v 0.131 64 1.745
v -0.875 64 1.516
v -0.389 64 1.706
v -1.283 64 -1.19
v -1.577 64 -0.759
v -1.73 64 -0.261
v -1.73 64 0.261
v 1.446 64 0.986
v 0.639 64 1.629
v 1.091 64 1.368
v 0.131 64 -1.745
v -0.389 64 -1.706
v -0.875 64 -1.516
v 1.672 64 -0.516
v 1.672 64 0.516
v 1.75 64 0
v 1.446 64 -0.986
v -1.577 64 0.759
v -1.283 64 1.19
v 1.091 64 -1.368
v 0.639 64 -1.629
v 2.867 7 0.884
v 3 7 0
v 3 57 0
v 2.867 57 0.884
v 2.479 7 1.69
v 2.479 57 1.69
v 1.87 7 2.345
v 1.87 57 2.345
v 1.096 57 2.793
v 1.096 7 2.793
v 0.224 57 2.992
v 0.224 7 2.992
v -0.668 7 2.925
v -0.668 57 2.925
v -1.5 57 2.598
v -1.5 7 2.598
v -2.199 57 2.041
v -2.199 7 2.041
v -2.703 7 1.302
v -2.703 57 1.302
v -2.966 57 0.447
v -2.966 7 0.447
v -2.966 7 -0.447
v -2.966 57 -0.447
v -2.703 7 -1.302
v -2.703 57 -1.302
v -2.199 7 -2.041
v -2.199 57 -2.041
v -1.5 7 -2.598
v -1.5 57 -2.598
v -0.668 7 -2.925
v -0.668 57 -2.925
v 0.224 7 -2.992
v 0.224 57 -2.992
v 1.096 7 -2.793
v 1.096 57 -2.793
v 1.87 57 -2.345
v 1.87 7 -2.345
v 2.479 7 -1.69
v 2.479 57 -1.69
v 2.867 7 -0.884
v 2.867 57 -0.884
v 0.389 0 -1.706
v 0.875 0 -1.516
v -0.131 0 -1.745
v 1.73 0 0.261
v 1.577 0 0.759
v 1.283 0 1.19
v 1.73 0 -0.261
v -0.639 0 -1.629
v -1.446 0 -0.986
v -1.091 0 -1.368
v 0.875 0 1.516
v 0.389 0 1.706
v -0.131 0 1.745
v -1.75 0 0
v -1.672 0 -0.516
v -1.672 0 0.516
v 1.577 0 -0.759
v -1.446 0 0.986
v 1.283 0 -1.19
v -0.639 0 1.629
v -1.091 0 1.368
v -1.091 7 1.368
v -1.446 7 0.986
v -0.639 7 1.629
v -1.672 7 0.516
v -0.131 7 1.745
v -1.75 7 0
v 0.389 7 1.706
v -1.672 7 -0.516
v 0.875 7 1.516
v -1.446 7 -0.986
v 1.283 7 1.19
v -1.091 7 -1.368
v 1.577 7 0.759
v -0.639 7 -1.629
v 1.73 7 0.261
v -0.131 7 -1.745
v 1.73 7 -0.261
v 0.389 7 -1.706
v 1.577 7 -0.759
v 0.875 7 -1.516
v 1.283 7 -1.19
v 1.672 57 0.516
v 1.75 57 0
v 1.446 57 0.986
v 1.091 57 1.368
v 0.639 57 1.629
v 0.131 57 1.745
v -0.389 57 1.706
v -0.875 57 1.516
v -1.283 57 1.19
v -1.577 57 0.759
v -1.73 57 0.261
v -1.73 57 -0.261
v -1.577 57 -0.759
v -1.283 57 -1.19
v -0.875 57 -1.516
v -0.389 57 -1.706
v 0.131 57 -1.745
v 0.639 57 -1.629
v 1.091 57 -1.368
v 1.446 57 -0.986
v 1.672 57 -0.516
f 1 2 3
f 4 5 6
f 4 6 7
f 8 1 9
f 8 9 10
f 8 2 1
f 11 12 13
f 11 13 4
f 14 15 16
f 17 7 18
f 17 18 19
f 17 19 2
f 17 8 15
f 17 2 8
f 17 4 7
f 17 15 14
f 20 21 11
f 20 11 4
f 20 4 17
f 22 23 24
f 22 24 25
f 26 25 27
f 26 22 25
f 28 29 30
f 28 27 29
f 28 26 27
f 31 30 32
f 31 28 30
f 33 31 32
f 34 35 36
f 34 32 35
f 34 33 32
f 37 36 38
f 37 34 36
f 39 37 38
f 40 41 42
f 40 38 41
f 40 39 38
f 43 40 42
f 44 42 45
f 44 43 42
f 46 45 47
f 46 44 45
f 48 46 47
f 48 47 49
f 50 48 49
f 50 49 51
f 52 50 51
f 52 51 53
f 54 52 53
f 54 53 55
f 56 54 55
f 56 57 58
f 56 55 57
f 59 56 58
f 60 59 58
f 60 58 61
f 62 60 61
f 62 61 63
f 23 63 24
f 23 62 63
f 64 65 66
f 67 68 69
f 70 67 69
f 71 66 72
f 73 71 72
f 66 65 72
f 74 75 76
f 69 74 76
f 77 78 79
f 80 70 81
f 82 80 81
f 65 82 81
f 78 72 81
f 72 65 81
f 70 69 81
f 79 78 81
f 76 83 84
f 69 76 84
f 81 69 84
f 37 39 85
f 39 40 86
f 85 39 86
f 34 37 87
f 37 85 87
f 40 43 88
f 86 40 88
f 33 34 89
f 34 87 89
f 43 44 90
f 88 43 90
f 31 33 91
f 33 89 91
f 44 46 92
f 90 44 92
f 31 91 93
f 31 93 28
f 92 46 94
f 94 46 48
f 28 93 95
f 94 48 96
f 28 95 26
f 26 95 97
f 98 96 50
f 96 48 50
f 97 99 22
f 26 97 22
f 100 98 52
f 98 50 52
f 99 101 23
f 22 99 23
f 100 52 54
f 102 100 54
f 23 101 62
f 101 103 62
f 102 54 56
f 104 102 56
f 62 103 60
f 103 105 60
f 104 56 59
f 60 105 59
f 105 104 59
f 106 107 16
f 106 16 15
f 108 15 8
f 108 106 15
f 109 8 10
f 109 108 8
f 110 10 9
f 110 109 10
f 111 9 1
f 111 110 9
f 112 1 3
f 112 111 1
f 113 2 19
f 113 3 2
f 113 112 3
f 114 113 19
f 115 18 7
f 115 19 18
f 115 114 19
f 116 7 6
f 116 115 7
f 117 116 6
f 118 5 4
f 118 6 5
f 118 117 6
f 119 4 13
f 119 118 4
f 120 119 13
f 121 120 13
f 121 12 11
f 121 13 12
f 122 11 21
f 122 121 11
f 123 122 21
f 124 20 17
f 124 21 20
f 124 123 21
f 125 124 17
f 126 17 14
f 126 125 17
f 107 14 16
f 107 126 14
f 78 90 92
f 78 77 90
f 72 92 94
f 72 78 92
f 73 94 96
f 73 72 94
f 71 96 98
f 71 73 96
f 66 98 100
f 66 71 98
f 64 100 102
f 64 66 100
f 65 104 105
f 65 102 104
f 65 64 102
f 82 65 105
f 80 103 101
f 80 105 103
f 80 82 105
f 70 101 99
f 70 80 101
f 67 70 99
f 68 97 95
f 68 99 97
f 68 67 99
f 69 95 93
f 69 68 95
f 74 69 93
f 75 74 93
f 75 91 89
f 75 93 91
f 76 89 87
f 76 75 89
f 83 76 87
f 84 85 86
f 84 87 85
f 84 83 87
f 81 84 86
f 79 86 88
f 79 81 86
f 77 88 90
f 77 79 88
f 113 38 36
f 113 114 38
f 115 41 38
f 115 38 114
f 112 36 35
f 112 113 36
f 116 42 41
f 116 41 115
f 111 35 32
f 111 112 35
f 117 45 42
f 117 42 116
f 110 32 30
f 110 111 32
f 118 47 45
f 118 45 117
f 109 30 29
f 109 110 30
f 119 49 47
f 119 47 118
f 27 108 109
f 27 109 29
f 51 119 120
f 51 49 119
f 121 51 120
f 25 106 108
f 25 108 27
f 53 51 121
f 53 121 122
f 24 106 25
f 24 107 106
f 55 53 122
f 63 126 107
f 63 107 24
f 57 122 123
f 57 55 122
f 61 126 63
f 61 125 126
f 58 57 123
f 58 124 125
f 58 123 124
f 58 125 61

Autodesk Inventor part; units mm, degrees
ref_plane "XZ Plane" through (0, 0, 0) normal (0, 1, 0) x (-1, 0, 0)
sketch "Szkic1" plane through (0, 0, 0) normal (0, 1, 0) x (-1, 0, 0)
  circle A0 centre (0, 0) radius 1.75
  dimension "d0" = 3.5
extrude "Wyciągnięcie proste1" add sketch "Szkic1" along normal blind 7
sketch "Szkic2" plane through (0, 7, 0) normal (0, 1, 0) x (1, 0, 0)
  circle A0 centre (0, 0) radius 3
  dimension "d3" = 6
extrude "Wyciągnięcie proste2" add sketch "Szkic2" along normal blind 50
sketch "Szkic3" plane through (0, 57, 0) normal (0, 1, 0) x (1, 0, 0)
  circle A0 centre (0, 0) radius 1.75 projected
  circle A1 centre (0, 0) radius 1.75
  dimension "d6" = 3.5
extrude "Wyciągnięcie proste3" add sketch "Szkic3" along normal blind 7
properties part number "rod"
